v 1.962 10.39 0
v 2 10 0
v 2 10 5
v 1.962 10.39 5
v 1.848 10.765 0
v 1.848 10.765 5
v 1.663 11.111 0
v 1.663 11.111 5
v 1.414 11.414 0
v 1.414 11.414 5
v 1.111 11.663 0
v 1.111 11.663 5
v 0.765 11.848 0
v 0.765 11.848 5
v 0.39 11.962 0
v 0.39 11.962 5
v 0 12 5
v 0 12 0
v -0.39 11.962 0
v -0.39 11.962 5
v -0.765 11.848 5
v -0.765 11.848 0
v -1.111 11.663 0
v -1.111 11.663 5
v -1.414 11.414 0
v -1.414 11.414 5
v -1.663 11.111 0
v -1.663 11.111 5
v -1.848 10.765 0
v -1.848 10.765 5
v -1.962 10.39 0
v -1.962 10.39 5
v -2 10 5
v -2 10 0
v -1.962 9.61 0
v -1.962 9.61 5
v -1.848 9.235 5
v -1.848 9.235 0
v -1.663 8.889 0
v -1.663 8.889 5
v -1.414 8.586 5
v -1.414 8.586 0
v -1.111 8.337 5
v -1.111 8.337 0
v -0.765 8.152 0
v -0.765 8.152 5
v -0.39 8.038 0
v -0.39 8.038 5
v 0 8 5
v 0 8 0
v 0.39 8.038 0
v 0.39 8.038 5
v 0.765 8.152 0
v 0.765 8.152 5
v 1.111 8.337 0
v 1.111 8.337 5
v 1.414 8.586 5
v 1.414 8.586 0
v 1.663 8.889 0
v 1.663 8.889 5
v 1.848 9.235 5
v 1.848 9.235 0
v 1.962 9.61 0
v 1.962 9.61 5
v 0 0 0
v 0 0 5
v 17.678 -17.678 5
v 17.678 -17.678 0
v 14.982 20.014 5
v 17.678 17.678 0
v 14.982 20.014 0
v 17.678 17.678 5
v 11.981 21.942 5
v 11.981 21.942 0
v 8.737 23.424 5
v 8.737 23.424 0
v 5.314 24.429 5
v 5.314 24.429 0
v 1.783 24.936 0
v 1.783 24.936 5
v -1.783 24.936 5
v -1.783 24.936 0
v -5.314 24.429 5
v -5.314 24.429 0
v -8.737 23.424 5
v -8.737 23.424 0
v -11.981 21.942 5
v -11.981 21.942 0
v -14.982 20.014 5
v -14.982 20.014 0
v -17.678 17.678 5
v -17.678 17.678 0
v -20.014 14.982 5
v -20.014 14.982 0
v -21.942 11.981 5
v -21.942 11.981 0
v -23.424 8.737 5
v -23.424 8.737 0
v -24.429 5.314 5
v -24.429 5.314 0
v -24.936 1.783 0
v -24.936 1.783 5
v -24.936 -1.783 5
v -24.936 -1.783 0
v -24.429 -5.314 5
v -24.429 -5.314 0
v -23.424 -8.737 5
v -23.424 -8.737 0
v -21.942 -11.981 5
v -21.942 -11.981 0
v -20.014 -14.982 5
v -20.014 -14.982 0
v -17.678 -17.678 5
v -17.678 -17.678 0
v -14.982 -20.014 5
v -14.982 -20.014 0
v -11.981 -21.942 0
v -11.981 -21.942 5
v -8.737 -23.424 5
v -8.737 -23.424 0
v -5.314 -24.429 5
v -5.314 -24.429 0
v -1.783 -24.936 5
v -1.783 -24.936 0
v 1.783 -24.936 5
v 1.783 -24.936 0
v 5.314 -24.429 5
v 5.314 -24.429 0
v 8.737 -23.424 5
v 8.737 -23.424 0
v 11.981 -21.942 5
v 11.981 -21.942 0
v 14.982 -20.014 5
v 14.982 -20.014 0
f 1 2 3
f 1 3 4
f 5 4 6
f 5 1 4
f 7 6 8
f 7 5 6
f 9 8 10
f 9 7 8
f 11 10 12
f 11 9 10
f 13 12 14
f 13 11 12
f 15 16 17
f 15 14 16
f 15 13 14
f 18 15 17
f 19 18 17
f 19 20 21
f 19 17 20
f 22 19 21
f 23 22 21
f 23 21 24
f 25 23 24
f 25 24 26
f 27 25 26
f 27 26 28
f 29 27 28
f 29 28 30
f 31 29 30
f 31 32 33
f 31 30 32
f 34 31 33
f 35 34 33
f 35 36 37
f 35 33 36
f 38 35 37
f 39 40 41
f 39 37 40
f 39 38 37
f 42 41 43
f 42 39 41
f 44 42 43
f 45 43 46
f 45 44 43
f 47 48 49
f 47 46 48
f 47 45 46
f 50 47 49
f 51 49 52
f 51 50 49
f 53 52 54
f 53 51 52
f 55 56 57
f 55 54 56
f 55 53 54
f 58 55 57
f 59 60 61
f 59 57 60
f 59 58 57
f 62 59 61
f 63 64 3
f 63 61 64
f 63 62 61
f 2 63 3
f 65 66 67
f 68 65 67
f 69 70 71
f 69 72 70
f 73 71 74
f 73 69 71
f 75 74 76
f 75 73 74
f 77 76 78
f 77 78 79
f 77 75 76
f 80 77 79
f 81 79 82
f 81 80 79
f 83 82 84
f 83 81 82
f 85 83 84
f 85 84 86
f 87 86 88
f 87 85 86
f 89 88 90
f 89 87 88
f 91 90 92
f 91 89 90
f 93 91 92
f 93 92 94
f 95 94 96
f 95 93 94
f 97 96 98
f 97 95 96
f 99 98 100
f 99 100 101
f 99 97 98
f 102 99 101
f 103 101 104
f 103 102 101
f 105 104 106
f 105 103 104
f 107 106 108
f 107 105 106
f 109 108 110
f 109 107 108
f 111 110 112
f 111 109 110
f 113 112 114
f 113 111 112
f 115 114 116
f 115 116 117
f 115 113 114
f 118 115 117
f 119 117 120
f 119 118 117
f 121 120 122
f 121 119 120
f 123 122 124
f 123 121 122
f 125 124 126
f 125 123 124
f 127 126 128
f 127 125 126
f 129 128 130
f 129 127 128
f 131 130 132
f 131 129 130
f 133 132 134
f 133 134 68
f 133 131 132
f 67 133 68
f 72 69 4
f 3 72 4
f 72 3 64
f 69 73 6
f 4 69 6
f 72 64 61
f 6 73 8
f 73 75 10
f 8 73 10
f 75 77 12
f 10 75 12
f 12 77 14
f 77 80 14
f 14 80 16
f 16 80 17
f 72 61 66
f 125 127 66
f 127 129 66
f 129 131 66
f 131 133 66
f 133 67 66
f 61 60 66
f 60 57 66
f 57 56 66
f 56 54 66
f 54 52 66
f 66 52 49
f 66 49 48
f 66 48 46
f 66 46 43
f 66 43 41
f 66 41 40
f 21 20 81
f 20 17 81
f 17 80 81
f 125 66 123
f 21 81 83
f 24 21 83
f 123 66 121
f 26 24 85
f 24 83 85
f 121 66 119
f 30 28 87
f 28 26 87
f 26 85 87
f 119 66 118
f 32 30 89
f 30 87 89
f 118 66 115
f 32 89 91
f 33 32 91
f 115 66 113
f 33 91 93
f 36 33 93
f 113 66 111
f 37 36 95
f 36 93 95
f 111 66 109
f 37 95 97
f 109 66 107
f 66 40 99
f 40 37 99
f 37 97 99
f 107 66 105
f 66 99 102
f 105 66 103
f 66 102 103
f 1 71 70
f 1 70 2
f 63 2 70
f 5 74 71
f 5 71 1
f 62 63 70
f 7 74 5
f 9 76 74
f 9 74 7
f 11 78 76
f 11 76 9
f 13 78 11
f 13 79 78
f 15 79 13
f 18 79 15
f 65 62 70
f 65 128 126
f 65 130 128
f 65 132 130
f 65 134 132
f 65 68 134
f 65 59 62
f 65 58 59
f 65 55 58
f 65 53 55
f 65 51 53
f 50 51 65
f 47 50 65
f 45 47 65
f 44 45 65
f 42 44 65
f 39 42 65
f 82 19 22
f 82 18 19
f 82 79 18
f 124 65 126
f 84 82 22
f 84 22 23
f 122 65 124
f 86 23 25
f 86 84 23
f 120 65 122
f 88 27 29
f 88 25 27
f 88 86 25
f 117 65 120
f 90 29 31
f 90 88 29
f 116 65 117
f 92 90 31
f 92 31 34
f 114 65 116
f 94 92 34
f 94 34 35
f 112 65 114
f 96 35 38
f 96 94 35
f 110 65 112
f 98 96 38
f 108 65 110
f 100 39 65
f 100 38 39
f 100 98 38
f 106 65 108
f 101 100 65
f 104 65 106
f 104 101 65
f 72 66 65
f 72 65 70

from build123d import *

# Parameters (mm, degrees)
CYLINDER001_R            = 2
CYLINDER001_DEPTH        = 10
CYLINDER_W               = 25
CYLINDER_H               = 5
CYLINDER_ANGLE           = 270
CYLINDER_PLACEMENT_ANGLE = 45


with BuildPart() as cilindre001:
    # Cylinder001 → Cylinder001 (new body)
    with BuildSketch(Plane(origin=(0, 10, -2), x_dir=(1, 0, 0), z_dir=(0, 0, 1))):
        Circle(CYLINDER001_R)
    extrude(amount=CYLINDER001_DEPTH)


with BuildPart() as cut:
    # Cylinder → Cylinder (revolve)
    with BuildSketch(Plane.XZ):
        with Locations((12.5, 2.5)):
            Rectangle(CYLINDER_W, CYLINDER_H)
    revolve(axis=Axis((0, 0, 0), (0, 0, 1)), revolution_arc=CYLINDER_ANGLE)


with BuildPart() as cut_1:
    # Cylinder placement: moved
    add(cut.part.rotate(Axis((0, 0, 0), (0, 0, 1)), CYLINDER_PLACEMENT_ANGLE))

    # Cut: cut Cilindre001
    add(cilindre001.part, mode=Mode.SUBTRACT)


solid = cut_1.part
